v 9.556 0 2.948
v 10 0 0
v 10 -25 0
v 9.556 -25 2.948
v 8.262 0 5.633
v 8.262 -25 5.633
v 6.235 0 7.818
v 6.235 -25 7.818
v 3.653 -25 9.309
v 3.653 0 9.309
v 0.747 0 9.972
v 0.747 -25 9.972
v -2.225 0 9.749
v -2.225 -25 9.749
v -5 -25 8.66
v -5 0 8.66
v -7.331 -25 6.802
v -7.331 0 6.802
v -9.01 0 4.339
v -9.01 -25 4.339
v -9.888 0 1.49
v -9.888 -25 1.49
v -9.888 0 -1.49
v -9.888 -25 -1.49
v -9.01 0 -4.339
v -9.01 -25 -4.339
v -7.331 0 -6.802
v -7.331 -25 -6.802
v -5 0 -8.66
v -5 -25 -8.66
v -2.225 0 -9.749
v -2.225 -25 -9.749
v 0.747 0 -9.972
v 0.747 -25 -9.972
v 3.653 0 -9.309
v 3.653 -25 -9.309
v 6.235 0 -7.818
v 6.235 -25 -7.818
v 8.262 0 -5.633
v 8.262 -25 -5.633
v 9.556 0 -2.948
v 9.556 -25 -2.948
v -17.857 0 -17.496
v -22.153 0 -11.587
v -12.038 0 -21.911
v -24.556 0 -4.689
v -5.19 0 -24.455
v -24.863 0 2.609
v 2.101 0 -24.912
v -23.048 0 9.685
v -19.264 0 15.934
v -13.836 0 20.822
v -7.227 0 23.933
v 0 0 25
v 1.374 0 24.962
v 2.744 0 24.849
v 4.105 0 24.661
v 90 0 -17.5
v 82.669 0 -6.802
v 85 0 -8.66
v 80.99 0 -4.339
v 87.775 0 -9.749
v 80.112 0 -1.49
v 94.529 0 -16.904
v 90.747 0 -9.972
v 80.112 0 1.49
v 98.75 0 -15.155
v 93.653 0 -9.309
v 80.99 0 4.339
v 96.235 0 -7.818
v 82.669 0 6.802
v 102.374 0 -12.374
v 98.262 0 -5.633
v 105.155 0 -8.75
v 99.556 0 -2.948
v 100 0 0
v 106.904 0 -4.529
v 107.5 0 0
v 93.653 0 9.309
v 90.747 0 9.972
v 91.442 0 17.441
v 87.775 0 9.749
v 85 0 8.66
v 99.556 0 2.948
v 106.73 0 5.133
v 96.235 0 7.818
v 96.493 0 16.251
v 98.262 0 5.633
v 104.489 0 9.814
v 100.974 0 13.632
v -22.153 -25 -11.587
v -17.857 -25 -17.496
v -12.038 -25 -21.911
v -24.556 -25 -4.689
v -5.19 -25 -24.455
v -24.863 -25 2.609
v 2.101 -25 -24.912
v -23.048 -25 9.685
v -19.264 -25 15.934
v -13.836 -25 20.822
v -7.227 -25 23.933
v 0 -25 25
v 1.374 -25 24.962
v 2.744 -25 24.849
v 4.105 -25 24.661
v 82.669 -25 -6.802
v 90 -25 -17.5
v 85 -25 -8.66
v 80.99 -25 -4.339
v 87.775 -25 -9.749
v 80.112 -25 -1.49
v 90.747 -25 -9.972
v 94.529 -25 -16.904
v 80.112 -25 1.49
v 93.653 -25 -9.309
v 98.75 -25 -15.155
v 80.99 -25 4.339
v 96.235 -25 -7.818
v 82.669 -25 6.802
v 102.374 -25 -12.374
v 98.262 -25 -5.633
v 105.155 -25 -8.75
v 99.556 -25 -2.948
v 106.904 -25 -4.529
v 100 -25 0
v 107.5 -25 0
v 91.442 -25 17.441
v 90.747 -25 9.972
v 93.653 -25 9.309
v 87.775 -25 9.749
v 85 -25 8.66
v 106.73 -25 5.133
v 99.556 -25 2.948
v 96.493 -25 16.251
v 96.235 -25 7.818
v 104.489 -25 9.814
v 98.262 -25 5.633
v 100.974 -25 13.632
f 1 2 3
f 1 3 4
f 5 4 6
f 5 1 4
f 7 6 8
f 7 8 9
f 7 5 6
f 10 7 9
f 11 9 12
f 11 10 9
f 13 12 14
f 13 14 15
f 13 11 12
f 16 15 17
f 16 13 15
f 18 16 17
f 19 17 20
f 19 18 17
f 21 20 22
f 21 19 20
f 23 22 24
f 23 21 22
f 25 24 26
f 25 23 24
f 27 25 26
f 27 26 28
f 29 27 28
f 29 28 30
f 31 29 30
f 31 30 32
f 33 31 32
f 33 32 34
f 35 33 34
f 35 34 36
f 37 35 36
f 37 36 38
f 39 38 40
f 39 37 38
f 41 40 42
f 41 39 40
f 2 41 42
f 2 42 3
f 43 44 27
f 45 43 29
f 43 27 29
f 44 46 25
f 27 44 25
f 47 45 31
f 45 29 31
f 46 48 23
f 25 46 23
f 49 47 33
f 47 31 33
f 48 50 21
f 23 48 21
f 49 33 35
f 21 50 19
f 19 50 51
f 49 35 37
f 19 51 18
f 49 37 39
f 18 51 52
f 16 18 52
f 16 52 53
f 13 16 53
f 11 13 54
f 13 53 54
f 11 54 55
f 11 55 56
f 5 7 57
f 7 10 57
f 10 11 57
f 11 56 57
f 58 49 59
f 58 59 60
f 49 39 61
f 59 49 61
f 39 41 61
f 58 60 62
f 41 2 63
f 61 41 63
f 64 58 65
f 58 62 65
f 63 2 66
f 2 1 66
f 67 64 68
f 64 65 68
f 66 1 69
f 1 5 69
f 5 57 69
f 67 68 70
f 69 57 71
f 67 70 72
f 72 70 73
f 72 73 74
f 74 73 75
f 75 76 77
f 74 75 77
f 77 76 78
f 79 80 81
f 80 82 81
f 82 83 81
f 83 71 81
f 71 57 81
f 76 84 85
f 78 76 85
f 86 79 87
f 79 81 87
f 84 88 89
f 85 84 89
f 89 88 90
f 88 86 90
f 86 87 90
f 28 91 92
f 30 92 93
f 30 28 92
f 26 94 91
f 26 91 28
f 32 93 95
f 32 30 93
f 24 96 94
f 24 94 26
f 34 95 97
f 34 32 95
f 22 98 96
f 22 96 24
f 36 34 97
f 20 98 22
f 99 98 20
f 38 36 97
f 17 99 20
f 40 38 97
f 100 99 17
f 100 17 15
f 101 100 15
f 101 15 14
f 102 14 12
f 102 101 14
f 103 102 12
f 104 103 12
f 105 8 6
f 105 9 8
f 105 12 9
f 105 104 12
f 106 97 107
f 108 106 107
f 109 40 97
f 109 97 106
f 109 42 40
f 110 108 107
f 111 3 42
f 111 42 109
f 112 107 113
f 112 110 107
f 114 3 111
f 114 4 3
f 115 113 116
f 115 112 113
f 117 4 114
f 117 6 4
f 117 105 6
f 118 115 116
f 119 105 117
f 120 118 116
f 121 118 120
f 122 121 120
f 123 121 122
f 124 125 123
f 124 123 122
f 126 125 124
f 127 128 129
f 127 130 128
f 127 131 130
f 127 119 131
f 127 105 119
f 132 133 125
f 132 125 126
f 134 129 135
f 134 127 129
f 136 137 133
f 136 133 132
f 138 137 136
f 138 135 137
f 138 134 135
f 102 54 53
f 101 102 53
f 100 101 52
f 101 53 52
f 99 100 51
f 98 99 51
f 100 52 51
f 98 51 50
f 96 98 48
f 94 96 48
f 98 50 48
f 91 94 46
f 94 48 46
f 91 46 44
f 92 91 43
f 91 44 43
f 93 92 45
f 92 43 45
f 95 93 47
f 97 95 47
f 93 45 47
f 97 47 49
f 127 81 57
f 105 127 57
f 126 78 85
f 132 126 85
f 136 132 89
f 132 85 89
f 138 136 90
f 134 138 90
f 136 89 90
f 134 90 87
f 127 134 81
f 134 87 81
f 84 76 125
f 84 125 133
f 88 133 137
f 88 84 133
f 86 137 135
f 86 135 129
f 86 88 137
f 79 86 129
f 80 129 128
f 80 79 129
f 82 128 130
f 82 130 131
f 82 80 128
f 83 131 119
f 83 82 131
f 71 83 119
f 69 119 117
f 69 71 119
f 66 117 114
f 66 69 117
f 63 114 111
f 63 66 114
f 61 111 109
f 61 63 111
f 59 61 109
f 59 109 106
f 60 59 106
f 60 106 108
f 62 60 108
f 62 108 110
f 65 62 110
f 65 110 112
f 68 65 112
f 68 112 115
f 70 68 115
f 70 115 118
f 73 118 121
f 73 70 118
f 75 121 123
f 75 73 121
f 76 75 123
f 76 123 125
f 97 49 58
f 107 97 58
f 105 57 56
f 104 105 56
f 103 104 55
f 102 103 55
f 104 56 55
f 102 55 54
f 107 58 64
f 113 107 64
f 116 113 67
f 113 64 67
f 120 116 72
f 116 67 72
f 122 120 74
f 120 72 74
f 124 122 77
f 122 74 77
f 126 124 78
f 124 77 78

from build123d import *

# Parameters (mm, degrees)
F0_R     = 10
F1_DEPTH = 25


with BuildPart() as f1:
    # F0 (on Front) → F1 (new body)
    with BuildSketch(Plane.XZ):
        with BuildLine():
            ThreePointArc((4.105443, 24.660603), (19.074015, 16.161125), (25, 0))
            ThreePointArc((25, 0), (18.40534, -16.918731), (2.100523, -24.9116))
            Line((2.100523, -24.9116), (90, -17.5))
            ThreePointArc((90, -17.5), (72.51488, 0.721517), (91.441807, 17.440504))
            Line((91.441807, 17.440504), (4.105443, 24.660603))
        make_face()
        with BuildLine():
            Line((0, 25), (4.105443, 24.660603))
            ThreePointArc((4.105443, 24.660603), (2.059724, 24.915006), (0, 25))
        make_face()
        with BuildLine():
            ThreePointArc((107.5, 0), (102.874036, 11.853657), (91.441807, 17.440504))
            ThreePointArc((91.441807, 17.440504), (72.51488, 0.721517), (90, -17.5))
            ThreePointArc((90, -17.5), (102.374369, -12.374369), (107.5, 0))
        make_face()
        with Locations((90, 0)):
            Circle(F0_R, mode=Mode.SUBTRACT)
        Circle(F0_R)
        with BuildLine():
            ThreePointArc((2.100523, -24.9116), (18.40534, -16.918731), (25, 0))
            ThreePointArc((25, 0), (19.074015, 16.161125), (4.105443, 24.660603))
            Line((4.105443, 24.660603), (0, 25))
            ThreePointArc((0, 25), (-24.97789, -1.051191), (2.100523, -24.9116))
        make_face()
        Circle(F0_R, mode=Mode.SUBTRACT)
    extrude(amount=F1_DEPTH)


solid = f1.part
